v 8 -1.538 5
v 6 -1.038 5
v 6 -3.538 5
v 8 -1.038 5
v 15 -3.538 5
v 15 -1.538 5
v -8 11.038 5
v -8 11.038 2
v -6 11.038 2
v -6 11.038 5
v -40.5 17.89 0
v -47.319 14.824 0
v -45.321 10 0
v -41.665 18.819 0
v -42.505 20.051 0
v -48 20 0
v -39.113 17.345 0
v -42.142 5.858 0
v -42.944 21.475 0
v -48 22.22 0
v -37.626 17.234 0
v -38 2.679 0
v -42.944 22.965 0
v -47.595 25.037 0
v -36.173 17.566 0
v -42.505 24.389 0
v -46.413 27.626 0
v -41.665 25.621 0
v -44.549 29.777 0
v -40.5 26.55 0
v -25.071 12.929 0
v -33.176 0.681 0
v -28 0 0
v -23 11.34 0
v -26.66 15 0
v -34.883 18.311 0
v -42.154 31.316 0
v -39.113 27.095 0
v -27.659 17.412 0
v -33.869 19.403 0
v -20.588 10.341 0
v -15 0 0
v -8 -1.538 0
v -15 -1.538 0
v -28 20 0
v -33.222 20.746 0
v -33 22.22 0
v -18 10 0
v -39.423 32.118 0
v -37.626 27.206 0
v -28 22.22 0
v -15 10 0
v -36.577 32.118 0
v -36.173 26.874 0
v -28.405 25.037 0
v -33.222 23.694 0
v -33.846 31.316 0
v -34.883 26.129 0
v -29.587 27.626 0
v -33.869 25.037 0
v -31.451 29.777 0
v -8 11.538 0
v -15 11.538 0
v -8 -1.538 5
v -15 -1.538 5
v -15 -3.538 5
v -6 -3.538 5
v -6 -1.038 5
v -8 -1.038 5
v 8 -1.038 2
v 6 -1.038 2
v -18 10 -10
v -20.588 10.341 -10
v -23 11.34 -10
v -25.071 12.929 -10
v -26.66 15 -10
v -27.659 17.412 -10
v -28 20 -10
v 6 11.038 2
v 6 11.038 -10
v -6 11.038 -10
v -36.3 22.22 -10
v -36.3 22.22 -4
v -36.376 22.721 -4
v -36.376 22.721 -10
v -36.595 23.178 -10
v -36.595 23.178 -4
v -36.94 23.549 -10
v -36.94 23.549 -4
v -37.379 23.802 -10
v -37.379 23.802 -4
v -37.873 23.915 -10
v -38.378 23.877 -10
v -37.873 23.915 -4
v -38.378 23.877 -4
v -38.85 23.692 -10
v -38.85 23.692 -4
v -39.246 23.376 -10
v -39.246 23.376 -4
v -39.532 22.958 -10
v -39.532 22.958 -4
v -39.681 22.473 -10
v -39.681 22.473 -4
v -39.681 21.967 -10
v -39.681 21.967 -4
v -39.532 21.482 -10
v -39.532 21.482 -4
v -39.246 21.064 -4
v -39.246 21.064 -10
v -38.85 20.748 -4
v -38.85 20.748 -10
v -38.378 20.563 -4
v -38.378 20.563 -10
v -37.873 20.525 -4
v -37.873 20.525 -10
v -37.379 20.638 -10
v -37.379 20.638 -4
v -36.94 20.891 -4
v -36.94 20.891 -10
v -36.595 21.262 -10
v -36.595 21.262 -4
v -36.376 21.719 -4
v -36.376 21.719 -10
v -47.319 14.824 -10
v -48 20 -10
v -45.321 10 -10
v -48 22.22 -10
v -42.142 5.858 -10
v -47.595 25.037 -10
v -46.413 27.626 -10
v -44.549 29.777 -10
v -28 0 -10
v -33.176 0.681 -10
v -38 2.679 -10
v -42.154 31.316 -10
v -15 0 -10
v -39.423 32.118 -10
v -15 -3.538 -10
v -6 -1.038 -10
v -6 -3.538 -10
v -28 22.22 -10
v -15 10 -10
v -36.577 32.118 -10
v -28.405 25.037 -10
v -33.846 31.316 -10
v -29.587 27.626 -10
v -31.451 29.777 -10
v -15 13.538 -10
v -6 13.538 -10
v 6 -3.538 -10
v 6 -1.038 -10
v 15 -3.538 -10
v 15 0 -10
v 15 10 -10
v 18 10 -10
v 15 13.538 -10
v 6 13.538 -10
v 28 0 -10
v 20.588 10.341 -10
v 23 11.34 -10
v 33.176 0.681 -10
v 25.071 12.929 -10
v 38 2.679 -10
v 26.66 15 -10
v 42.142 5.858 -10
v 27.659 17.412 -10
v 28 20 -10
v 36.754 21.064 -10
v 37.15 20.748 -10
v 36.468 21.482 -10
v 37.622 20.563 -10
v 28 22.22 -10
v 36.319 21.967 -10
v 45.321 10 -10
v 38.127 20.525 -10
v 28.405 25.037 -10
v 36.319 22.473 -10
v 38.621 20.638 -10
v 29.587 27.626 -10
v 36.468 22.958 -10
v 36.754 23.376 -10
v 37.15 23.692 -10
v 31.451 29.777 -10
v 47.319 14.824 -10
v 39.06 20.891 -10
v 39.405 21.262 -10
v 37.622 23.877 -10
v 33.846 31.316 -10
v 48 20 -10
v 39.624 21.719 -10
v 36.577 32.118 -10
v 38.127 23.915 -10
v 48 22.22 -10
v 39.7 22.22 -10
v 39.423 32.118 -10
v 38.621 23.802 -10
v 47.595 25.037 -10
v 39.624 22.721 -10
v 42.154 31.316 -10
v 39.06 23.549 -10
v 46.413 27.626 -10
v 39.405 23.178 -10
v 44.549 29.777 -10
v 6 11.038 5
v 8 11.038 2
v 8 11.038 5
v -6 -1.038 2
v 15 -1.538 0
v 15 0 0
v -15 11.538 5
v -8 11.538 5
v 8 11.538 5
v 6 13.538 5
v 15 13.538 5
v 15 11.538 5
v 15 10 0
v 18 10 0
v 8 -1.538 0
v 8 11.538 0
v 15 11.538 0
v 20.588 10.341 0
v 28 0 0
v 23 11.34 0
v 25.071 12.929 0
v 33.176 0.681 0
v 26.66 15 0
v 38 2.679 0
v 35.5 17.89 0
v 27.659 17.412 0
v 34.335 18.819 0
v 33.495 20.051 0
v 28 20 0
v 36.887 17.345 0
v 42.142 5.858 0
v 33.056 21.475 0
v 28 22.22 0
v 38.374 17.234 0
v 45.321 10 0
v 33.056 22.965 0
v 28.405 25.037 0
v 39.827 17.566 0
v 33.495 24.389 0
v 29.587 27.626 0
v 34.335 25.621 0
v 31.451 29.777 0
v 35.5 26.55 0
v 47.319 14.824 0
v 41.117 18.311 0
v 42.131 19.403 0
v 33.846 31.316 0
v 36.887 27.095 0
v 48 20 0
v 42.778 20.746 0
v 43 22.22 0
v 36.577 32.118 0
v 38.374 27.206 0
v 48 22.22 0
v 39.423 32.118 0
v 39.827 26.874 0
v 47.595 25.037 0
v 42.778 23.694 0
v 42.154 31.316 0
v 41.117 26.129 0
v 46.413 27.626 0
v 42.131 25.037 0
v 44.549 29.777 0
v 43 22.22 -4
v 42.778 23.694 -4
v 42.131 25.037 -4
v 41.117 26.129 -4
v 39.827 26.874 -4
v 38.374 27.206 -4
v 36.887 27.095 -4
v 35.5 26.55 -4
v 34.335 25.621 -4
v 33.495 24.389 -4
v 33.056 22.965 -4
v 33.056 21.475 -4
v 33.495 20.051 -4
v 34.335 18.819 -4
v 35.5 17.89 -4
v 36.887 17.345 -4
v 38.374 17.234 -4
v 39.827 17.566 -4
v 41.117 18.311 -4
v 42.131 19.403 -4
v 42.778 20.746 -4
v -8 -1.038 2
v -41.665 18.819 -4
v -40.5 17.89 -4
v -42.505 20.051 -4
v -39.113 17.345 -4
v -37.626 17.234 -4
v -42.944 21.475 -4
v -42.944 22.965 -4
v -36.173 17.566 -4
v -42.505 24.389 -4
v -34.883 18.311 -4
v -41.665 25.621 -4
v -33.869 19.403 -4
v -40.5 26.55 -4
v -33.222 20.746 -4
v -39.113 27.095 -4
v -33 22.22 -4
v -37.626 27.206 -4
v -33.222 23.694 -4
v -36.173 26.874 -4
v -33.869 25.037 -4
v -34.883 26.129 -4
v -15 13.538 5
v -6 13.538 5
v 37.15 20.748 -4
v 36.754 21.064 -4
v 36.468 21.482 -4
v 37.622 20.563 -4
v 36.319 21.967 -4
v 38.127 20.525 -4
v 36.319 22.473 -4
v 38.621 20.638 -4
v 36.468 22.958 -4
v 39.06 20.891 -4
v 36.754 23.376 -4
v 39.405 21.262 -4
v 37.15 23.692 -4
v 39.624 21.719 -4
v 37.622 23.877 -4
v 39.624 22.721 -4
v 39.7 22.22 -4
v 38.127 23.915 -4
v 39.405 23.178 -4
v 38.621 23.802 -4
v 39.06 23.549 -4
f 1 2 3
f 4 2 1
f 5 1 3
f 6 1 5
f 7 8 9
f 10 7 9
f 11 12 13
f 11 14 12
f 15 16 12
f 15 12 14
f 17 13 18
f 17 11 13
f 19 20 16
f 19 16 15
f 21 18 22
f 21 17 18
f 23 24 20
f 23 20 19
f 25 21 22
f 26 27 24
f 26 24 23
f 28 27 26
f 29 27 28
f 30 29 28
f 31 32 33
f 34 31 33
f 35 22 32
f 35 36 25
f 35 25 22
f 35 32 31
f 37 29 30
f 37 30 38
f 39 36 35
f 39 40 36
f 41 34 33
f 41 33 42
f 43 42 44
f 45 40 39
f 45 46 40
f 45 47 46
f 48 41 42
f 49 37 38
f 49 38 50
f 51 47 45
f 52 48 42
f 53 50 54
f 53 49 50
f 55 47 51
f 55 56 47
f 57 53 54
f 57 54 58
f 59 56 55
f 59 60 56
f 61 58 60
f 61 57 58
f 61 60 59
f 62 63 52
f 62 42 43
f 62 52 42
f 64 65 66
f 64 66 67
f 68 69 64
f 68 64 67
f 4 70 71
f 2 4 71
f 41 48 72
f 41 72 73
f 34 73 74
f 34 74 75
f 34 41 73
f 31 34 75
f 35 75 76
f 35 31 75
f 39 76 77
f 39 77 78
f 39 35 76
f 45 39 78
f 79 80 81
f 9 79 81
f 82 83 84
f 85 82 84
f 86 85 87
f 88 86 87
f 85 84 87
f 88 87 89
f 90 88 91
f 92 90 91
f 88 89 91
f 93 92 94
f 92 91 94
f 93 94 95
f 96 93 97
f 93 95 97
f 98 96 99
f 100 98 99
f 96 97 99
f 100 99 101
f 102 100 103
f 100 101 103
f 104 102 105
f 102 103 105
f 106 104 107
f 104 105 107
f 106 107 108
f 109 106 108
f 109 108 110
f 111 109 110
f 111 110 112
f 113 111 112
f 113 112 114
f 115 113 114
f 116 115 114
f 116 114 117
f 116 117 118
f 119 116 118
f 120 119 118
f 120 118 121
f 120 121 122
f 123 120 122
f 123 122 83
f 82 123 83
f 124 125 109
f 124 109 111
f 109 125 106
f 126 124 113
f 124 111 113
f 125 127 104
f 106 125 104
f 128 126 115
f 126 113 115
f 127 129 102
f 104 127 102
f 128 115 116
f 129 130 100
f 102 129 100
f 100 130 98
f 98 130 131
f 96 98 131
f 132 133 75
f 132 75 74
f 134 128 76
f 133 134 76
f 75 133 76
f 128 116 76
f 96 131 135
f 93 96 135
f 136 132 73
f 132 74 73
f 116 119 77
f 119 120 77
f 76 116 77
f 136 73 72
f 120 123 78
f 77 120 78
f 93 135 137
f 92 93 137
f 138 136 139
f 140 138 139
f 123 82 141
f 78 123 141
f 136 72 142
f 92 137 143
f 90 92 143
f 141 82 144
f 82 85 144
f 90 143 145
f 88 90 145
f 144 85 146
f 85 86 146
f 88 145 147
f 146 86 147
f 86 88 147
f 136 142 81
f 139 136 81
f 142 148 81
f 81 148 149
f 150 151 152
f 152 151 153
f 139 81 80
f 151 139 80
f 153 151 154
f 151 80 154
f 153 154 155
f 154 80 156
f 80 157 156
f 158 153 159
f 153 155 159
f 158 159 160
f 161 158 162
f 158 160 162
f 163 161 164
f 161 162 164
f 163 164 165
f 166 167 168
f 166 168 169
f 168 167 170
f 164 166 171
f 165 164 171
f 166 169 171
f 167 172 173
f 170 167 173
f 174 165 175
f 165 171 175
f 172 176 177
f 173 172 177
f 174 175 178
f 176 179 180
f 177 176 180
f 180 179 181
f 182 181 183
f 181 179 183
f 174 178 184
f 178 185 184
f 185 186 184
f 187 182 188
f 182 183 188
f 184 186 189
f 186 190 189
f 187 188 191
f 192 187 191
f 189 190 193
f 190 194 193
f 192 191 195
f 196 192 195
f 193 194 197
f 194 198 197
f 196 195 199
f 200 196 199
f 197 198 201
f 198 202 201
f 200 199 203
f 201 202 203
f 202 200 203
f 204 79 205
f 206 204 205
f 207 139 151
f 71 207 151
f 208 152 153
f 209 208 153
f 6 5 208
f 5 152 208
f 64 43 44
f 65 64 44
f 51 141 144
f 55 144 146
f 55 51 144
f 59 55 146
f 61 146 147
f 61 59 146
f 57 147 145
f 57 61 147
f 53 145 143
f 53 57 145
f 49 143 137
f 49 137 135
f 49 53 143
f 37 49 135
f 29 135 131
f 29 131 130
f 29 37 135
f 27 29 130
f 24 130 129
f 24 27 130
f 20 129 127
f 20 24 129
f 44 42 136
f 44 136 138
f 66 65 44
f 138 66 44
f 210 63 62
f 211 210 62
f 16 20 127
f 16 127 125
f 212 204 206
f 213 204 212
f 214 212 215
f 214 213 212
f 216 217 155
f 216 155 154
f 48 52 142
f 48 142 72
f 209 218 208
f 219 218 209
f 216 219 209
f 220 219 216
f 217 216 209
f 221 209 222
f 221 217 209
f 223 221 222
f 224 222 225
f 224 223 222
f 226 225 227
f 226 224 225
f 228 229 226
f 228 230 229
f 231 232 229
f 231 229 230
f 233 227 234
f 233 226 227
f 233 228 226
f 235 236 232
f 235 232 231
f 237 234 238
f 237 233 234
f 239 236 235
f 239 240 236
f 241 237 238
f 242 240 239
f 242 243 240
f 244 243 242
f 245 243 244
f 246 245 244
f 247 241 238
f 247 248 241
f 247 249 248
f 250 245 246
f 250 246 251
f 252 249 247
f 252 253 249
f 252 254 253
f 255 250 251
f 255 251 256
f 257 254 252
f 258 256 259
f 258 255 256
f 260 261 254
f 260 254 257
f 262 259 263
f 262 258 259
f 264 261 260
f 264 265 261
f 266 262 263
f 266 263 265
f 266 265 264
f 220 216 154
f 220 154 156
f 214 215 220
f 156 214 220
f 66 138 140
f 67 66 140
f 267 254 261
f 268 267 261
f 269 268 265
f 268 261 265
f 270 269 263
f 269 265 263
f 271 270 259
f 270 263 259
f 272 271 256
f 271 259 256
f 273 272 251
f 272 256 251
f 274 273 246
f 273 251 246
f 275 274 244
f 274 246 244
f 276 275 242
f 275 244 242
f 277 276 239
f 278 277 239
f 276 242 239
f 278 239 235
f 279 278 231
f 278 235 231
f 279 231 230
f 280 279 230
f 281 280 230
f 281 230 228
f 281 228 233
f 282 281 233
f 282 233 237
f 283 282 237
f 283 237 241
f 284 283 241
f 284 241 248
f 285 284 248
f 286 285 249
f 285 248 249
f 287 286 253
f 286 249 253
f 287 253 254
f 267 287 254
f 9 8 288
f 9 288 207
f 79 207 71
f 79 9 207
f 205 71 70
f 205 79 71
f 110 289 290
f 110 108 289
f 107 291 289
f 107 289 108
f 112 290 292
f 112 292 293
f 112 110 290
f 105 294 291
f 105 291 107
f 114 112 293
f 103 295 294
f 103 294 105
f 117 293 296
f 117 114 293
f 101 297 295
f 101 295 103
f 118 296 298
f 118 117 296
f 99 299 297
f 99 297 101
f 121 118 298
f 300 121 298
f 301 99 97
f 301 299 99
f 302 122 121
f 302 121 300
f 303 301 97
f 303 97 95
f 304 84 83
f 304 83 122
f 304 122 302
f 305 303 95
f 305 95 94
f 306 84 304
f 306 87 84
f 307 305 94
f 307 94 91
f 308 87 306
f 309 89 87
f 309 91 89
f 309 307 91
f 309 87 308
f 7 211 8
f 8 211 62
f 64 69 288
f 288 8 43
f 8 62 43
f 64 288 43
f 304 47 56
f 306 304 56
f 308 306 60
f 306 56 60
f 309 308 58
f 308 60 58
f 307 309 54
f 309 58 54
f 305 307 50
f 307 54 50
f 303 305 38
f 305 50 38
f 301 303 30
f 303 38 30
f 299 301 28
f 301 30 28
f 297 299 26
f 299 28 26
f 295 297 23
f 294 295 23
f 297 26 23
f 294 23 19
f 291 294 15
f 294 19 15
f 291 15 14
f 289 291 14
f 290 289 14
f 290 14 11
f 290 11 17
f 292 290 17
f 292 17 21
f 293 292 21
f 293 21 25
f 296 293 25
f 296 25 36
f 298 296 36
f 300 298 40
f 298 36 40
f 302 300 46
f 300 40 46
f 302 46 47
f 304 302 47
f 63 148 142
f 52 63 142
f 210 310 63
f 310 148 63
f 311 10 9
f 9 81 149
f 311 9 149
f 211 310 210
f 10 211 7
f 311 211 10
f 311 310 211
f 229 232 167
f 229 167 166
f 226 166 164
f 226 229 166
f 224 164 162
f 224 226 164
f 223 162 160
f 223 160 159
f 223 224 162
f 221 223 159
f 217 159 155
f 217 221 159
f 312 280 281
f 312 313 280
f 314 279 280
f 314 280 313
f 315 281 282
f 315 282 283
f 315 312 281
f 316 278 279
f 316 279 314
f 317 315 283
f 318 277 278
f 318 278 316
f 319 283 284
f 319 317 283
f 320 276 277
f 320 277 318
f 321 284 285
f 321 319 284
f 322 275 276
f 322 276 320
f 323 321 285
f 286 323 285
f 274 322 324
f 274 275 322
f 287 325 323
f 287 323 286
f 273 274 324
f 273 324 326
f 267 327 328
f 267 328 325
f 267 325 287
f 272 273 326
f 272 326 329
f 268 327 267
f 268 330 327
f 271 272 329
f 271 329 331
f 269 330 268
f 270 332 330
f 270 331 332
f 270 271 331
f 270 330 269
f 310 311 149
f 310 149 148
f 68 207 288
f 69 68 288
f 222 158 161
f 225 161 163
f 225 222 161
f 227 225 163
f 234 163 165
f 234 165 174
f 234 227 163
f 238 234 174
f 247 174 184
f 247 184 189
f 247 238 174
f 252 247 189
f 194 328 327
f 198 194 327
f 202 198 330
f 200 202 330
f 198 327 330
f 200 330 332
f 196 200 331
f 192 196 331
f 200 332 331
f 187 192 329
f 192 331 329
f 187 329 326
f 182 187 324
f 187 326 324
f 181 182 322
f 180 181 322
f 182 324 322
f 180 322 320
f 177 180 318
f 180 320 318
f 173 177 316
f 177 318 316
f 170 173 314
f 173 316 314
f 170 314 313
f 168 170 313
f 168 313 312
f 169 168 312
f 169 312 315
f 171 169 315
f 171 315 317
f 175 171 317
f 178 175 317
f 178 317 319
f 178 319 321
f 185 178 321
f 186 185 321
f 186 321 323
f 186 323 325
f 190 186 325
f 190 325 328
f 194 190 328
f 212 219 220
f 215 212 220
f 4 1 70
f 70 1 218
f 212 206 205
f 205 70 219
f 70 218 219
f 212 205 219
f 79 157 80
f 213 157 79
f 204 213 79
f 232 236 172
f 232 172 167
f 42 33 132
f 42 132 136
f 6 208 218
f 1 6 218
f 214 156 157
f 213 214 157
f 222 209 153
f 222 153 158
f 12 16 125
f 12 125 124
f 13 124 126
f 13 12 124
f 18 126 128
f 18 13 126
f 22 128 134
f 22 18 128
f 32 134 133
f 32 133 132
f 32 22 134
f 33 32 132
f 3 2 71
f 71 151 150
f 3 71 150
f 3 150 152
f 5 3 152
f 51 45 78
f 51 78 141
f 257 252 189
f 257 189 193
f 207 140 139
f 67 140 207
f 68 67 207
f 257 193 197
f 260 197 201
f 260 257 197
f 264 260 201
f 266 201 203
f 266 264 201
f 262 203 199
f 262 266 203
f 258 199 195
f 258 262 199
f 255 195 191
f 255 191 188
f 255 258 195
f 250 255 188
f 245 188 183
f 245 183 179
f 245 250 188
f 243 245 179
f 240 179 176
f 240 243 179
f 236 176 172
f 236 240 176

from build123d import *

# Parameters (mm, degrees)
SKETCH1_R           = 5
SKETCH1_R_2         = 1.7
BOSS_EXTRUDE1_DEPTH = 10
SKETCH1_4_R         = 5
SKETCH1_4_R_2       = 1.7
CUT_EXTRUDE1_DEPTH  = 4
SKETCH3_W           = 6
SKETCH3_H           = 1.0375
SKETCH3_W_2         = 2
BOSS_EXTRUDE2_DEPTH = 10
BOSS_EXTRUDE3_DEPTH = 5
SKETCH3_4_W         = 2
SKETCH3_4_H         = 10
SKETCH3_4_W_2       = 6
SKETCH3_4_H_2       = 1.0375
BOSS_EXTRUDE4_DEPTH = 2


with BuildPart() as part:
    # Sketch1 → Boss-Extrude1 (new body)
    # profile 1 of 4: a face of its own
    with BuildSketch(Plane.XY):
        with BuildLine():
            Line((-48, 22.22), (-48, 20))
            ThreePointArc((-48, 20), (-42.142135624, 5.857864376), (-28, 0))
            Line((-28, 0), (0, 0))
            Line((0, 0), (0, 10))
            Line((0, 10), (-18, 10))
            ThreePointArc((-18, 10), (-25.071067812, 12.928932188), (-28, 20))
            Line((-28, 20), (-28, 22.22))
            ThreePointArc((-28, 22.22), (-38, 32.22), (-48, 22.22))
        make_face()
        with Locations((-38, 22.22)):
            Circle(SKETCH1_R, mode=Mode.SUBTRACT)
    # profile 2 of 4: a face of its own
    with BuildSketch(Plane.XY):
        with Locations((-38, 22.22)):
            Circle(SKETCH1_R)
        with Locations((-38, 22.22)):
            Circle(SKETCH1_R_2, mode=Mode.SUBTRACT)
    # profile 3 of 4: a face of its own
    with BuildSketch(Plane.XY):
        with BuildLine():
            Line((0, 10), (0, 0))
            Line((0, 0), (28, 0))
            ThreePointArc((28, 0), (42.142135624, 5.857864376), (48, 20))
            Line((48, 20), (48, 22.22))
            ThreePointArc((48, 22.22), (38, 32.22), (28, 22.22))
            Line((28, 22.22), (28, 20))
            ThreePointArc((28, 20), (25.071067812, 12.928932188), (18, 10))
            Line((18, 10), (0, 10))
        make_face()
        with Locations((38, 22.22)):
            Circle(SKETCH1_R, mode=Mode.SUBTRACT)
    # profile 4 of 4: a face of its own
    with BuildSketch(Plane.XY):
        with Locations((38, 22.22)):
            Circle(SKETCH1_R)
        with Locations((38, 22.22)):
            Circle(SKETCH1_R_2, mode=Mode.SUBTRACT)
    extrude(amount=-BOSS_EXTRUDE1_DEPTH)

    # Sketch1<4> → Cut-Extrude1 (cut)
    # profile 1 of 2: a face of its own
    with BuildSketch(Plane.XY):
        with Locations((-38, 22.22)):
            Circle(SKETCH1_4_R)
        with Locations((-38, 22.22)):
            Circle(SKETCH1_4_R_2, mode=Mode.SUBTRACT)
    # profile 2 of 2: a face of its own
    with BuildSketch(Plane.XY):
        with Locations((38, 22.22)):
            Circle(SKETCH1_4_R)
        with Locations((38, 22.22)):
            Circle(SKETCH1_4_R_2, mode=Mode.SUBTRACT)
    extrude(amount=-CUT_EXTRUDE1_DEPTH, mode=Mode.SUBTRACT)

    # Sketch3 → Boss-Extrude2 (add, through all)
    with BuildSketch(Plane.XY):
        with Locations((-3, 10.51875)):
            Rectangle(SKETCH3_W, SKETCH3_H)
        with Locations((3, 10.51875)):
            Rectangle(SKETCH3_W, SKETCH3_H)
        with Locations((-3, -0.51875)):
            Rectangle(SKETCH3_W, SKETCH3_H)
        with Locations((3, -0.51875)):
            Rectangle(SKETCH3_W, SKETCH3_H)
        with Locations((-7, 10.51875)):
            Rectangle(SKETCH3_W_2, SKETCH3_H)
        Polygon((-15, 10), (-8, 10), (-8, 11.0375), (-8, 11.5375), (-15, 11.5375), align=None)
        Polygon((-8, 11.0375), (-6, 11.0375), (-6, 13.5375), (-15, 13.5375), (-15, 11.5375), (-8, 11.5375), align=None)
        Polygon((-6, -3.5375), (-6, -1.0375), (-8, -1.0375), (-8, -1.5375), (-15, -1.5375), (-15, -3.5375), align=None)
        with Locations((-7, -0.51875)):
            Rectangle(SKETCH3_W_2, SKETCH3_H)
        with Locations((7, -0.51875)):
            Rectangle(SKETCH3_W_2, SKETCH3_H)
        Polygon((8, -1.0375), (6, -1.0375), (6, -3.5375), (15, -3.5375), (15, -1.5375), (8, -1.5375), align=None)
        Polygon((8, 0), (8, -1.0375), (8, -1.5375), (15, -1.5375), (15, 0), align=None)
        Polygon((8, 11.0375), (8, 10), (15, 10), (15, 11.5375), (8, 11.5375), align=None)
        with Locations((7, 10.51875)):
            Rectangle(SKETCH3_W_2, SKETCH3_H)
        Polygon((6, 13.5375), (6, 11.0375), (8, 11.0375), (8, 11.5375), (15, 11.5375), (15, 13.5375), align=None)
        Polygon((-8, -1.5375), (-8, -1.0375), (-8, 0), (-15, 0), (-15, -1.5375), align=None)
    extrude(amount=-BOSS_EXTRUDE2_DEPTH)

    # Sketch3<3> → Boss-Extrude3 (add)
    with BuildSketch(Plane.XY):
        Polygon((-8, 11.0375), (-6, 11.0375), (-6, 13.5375), (-15, 13.5375), (-15, 11.5375), (-8, 11.5375), align=None)
        Polygon((-6, -3.5375), (-6, -1.0375), (-8, -1.0375), (-8, -1.5375), (-15, -1.5375), (-15, -3.5375), align=None)
        Polygon((8, -1.0375), (6, -1.0375), (6, -3.5375), (15, -3.5375), (15, -1.5375), (8, -1.5375), align=None)
        Polygon((6, 13.5375), (6, 11.0375), (8, 11.0375), (8, 11.5375), (15, 11.5375), (15, 13.5375), align=None)
    extrude(amount=BOSS_EXTRUDE3_DEPTH)

    # Sketch3<4> → Boss-Extrude4 (add)
    with BuildSketch(Plane.XY):
        with Locations((-7, 5)):
            Rectangle(SKETCH3_4_W, SKETCH3_4_H)
        with Locations((-3, 5)):
            Rectangle(SKETCH3_4_W_2, SKETCH3_4_H)
        with Locations((7, 5)):
            Rectangle(SKETCH3_4_W, SKETCH3_4_H)
        with Locations((3, 5)):
            Rectangle(SKETCH3_4_W_2, SKETCH3_4_H)
        with Locations((3, 10.51875)):
            Rectangle(SKETCH3_4_W_2, SKETCH3_4_H_2)
        with Locations((7, 10.51875)):
            Rectangle(SKETCH3_4_W, SKETCH3_4_H_2)
        with Locations((-3, 10.51875)):
            Rectangle(SKETCH3_4_W_2, SKETCH3_4_H_2)
        with Locations((-7, 10.51875)):
            Rectangle(SKETCH3_4_W, SKETCH3_4_H_2)
        with Locations((-7, -0.51875)):
            Rectangle(SKETCH3_4_W, SKETCH3_4_H_2)
        with Locations((-3, -0.51875)):
            Rectangle(SKETCH3_4_W_2, SKETCH3_4_H_2)
        with Locations((3, -0.51875)):
            Rectangle(SKETCH3_4_W_2, SKETCH3_4_H_2)
        with Locations((7, -0.51875)):
            Rectangle(SKETCH3_4_W, SKETCH3_4_H_2)
    extrude(amount=BOSS_EXTRUDE4_DEPTH)


solid = part.part
